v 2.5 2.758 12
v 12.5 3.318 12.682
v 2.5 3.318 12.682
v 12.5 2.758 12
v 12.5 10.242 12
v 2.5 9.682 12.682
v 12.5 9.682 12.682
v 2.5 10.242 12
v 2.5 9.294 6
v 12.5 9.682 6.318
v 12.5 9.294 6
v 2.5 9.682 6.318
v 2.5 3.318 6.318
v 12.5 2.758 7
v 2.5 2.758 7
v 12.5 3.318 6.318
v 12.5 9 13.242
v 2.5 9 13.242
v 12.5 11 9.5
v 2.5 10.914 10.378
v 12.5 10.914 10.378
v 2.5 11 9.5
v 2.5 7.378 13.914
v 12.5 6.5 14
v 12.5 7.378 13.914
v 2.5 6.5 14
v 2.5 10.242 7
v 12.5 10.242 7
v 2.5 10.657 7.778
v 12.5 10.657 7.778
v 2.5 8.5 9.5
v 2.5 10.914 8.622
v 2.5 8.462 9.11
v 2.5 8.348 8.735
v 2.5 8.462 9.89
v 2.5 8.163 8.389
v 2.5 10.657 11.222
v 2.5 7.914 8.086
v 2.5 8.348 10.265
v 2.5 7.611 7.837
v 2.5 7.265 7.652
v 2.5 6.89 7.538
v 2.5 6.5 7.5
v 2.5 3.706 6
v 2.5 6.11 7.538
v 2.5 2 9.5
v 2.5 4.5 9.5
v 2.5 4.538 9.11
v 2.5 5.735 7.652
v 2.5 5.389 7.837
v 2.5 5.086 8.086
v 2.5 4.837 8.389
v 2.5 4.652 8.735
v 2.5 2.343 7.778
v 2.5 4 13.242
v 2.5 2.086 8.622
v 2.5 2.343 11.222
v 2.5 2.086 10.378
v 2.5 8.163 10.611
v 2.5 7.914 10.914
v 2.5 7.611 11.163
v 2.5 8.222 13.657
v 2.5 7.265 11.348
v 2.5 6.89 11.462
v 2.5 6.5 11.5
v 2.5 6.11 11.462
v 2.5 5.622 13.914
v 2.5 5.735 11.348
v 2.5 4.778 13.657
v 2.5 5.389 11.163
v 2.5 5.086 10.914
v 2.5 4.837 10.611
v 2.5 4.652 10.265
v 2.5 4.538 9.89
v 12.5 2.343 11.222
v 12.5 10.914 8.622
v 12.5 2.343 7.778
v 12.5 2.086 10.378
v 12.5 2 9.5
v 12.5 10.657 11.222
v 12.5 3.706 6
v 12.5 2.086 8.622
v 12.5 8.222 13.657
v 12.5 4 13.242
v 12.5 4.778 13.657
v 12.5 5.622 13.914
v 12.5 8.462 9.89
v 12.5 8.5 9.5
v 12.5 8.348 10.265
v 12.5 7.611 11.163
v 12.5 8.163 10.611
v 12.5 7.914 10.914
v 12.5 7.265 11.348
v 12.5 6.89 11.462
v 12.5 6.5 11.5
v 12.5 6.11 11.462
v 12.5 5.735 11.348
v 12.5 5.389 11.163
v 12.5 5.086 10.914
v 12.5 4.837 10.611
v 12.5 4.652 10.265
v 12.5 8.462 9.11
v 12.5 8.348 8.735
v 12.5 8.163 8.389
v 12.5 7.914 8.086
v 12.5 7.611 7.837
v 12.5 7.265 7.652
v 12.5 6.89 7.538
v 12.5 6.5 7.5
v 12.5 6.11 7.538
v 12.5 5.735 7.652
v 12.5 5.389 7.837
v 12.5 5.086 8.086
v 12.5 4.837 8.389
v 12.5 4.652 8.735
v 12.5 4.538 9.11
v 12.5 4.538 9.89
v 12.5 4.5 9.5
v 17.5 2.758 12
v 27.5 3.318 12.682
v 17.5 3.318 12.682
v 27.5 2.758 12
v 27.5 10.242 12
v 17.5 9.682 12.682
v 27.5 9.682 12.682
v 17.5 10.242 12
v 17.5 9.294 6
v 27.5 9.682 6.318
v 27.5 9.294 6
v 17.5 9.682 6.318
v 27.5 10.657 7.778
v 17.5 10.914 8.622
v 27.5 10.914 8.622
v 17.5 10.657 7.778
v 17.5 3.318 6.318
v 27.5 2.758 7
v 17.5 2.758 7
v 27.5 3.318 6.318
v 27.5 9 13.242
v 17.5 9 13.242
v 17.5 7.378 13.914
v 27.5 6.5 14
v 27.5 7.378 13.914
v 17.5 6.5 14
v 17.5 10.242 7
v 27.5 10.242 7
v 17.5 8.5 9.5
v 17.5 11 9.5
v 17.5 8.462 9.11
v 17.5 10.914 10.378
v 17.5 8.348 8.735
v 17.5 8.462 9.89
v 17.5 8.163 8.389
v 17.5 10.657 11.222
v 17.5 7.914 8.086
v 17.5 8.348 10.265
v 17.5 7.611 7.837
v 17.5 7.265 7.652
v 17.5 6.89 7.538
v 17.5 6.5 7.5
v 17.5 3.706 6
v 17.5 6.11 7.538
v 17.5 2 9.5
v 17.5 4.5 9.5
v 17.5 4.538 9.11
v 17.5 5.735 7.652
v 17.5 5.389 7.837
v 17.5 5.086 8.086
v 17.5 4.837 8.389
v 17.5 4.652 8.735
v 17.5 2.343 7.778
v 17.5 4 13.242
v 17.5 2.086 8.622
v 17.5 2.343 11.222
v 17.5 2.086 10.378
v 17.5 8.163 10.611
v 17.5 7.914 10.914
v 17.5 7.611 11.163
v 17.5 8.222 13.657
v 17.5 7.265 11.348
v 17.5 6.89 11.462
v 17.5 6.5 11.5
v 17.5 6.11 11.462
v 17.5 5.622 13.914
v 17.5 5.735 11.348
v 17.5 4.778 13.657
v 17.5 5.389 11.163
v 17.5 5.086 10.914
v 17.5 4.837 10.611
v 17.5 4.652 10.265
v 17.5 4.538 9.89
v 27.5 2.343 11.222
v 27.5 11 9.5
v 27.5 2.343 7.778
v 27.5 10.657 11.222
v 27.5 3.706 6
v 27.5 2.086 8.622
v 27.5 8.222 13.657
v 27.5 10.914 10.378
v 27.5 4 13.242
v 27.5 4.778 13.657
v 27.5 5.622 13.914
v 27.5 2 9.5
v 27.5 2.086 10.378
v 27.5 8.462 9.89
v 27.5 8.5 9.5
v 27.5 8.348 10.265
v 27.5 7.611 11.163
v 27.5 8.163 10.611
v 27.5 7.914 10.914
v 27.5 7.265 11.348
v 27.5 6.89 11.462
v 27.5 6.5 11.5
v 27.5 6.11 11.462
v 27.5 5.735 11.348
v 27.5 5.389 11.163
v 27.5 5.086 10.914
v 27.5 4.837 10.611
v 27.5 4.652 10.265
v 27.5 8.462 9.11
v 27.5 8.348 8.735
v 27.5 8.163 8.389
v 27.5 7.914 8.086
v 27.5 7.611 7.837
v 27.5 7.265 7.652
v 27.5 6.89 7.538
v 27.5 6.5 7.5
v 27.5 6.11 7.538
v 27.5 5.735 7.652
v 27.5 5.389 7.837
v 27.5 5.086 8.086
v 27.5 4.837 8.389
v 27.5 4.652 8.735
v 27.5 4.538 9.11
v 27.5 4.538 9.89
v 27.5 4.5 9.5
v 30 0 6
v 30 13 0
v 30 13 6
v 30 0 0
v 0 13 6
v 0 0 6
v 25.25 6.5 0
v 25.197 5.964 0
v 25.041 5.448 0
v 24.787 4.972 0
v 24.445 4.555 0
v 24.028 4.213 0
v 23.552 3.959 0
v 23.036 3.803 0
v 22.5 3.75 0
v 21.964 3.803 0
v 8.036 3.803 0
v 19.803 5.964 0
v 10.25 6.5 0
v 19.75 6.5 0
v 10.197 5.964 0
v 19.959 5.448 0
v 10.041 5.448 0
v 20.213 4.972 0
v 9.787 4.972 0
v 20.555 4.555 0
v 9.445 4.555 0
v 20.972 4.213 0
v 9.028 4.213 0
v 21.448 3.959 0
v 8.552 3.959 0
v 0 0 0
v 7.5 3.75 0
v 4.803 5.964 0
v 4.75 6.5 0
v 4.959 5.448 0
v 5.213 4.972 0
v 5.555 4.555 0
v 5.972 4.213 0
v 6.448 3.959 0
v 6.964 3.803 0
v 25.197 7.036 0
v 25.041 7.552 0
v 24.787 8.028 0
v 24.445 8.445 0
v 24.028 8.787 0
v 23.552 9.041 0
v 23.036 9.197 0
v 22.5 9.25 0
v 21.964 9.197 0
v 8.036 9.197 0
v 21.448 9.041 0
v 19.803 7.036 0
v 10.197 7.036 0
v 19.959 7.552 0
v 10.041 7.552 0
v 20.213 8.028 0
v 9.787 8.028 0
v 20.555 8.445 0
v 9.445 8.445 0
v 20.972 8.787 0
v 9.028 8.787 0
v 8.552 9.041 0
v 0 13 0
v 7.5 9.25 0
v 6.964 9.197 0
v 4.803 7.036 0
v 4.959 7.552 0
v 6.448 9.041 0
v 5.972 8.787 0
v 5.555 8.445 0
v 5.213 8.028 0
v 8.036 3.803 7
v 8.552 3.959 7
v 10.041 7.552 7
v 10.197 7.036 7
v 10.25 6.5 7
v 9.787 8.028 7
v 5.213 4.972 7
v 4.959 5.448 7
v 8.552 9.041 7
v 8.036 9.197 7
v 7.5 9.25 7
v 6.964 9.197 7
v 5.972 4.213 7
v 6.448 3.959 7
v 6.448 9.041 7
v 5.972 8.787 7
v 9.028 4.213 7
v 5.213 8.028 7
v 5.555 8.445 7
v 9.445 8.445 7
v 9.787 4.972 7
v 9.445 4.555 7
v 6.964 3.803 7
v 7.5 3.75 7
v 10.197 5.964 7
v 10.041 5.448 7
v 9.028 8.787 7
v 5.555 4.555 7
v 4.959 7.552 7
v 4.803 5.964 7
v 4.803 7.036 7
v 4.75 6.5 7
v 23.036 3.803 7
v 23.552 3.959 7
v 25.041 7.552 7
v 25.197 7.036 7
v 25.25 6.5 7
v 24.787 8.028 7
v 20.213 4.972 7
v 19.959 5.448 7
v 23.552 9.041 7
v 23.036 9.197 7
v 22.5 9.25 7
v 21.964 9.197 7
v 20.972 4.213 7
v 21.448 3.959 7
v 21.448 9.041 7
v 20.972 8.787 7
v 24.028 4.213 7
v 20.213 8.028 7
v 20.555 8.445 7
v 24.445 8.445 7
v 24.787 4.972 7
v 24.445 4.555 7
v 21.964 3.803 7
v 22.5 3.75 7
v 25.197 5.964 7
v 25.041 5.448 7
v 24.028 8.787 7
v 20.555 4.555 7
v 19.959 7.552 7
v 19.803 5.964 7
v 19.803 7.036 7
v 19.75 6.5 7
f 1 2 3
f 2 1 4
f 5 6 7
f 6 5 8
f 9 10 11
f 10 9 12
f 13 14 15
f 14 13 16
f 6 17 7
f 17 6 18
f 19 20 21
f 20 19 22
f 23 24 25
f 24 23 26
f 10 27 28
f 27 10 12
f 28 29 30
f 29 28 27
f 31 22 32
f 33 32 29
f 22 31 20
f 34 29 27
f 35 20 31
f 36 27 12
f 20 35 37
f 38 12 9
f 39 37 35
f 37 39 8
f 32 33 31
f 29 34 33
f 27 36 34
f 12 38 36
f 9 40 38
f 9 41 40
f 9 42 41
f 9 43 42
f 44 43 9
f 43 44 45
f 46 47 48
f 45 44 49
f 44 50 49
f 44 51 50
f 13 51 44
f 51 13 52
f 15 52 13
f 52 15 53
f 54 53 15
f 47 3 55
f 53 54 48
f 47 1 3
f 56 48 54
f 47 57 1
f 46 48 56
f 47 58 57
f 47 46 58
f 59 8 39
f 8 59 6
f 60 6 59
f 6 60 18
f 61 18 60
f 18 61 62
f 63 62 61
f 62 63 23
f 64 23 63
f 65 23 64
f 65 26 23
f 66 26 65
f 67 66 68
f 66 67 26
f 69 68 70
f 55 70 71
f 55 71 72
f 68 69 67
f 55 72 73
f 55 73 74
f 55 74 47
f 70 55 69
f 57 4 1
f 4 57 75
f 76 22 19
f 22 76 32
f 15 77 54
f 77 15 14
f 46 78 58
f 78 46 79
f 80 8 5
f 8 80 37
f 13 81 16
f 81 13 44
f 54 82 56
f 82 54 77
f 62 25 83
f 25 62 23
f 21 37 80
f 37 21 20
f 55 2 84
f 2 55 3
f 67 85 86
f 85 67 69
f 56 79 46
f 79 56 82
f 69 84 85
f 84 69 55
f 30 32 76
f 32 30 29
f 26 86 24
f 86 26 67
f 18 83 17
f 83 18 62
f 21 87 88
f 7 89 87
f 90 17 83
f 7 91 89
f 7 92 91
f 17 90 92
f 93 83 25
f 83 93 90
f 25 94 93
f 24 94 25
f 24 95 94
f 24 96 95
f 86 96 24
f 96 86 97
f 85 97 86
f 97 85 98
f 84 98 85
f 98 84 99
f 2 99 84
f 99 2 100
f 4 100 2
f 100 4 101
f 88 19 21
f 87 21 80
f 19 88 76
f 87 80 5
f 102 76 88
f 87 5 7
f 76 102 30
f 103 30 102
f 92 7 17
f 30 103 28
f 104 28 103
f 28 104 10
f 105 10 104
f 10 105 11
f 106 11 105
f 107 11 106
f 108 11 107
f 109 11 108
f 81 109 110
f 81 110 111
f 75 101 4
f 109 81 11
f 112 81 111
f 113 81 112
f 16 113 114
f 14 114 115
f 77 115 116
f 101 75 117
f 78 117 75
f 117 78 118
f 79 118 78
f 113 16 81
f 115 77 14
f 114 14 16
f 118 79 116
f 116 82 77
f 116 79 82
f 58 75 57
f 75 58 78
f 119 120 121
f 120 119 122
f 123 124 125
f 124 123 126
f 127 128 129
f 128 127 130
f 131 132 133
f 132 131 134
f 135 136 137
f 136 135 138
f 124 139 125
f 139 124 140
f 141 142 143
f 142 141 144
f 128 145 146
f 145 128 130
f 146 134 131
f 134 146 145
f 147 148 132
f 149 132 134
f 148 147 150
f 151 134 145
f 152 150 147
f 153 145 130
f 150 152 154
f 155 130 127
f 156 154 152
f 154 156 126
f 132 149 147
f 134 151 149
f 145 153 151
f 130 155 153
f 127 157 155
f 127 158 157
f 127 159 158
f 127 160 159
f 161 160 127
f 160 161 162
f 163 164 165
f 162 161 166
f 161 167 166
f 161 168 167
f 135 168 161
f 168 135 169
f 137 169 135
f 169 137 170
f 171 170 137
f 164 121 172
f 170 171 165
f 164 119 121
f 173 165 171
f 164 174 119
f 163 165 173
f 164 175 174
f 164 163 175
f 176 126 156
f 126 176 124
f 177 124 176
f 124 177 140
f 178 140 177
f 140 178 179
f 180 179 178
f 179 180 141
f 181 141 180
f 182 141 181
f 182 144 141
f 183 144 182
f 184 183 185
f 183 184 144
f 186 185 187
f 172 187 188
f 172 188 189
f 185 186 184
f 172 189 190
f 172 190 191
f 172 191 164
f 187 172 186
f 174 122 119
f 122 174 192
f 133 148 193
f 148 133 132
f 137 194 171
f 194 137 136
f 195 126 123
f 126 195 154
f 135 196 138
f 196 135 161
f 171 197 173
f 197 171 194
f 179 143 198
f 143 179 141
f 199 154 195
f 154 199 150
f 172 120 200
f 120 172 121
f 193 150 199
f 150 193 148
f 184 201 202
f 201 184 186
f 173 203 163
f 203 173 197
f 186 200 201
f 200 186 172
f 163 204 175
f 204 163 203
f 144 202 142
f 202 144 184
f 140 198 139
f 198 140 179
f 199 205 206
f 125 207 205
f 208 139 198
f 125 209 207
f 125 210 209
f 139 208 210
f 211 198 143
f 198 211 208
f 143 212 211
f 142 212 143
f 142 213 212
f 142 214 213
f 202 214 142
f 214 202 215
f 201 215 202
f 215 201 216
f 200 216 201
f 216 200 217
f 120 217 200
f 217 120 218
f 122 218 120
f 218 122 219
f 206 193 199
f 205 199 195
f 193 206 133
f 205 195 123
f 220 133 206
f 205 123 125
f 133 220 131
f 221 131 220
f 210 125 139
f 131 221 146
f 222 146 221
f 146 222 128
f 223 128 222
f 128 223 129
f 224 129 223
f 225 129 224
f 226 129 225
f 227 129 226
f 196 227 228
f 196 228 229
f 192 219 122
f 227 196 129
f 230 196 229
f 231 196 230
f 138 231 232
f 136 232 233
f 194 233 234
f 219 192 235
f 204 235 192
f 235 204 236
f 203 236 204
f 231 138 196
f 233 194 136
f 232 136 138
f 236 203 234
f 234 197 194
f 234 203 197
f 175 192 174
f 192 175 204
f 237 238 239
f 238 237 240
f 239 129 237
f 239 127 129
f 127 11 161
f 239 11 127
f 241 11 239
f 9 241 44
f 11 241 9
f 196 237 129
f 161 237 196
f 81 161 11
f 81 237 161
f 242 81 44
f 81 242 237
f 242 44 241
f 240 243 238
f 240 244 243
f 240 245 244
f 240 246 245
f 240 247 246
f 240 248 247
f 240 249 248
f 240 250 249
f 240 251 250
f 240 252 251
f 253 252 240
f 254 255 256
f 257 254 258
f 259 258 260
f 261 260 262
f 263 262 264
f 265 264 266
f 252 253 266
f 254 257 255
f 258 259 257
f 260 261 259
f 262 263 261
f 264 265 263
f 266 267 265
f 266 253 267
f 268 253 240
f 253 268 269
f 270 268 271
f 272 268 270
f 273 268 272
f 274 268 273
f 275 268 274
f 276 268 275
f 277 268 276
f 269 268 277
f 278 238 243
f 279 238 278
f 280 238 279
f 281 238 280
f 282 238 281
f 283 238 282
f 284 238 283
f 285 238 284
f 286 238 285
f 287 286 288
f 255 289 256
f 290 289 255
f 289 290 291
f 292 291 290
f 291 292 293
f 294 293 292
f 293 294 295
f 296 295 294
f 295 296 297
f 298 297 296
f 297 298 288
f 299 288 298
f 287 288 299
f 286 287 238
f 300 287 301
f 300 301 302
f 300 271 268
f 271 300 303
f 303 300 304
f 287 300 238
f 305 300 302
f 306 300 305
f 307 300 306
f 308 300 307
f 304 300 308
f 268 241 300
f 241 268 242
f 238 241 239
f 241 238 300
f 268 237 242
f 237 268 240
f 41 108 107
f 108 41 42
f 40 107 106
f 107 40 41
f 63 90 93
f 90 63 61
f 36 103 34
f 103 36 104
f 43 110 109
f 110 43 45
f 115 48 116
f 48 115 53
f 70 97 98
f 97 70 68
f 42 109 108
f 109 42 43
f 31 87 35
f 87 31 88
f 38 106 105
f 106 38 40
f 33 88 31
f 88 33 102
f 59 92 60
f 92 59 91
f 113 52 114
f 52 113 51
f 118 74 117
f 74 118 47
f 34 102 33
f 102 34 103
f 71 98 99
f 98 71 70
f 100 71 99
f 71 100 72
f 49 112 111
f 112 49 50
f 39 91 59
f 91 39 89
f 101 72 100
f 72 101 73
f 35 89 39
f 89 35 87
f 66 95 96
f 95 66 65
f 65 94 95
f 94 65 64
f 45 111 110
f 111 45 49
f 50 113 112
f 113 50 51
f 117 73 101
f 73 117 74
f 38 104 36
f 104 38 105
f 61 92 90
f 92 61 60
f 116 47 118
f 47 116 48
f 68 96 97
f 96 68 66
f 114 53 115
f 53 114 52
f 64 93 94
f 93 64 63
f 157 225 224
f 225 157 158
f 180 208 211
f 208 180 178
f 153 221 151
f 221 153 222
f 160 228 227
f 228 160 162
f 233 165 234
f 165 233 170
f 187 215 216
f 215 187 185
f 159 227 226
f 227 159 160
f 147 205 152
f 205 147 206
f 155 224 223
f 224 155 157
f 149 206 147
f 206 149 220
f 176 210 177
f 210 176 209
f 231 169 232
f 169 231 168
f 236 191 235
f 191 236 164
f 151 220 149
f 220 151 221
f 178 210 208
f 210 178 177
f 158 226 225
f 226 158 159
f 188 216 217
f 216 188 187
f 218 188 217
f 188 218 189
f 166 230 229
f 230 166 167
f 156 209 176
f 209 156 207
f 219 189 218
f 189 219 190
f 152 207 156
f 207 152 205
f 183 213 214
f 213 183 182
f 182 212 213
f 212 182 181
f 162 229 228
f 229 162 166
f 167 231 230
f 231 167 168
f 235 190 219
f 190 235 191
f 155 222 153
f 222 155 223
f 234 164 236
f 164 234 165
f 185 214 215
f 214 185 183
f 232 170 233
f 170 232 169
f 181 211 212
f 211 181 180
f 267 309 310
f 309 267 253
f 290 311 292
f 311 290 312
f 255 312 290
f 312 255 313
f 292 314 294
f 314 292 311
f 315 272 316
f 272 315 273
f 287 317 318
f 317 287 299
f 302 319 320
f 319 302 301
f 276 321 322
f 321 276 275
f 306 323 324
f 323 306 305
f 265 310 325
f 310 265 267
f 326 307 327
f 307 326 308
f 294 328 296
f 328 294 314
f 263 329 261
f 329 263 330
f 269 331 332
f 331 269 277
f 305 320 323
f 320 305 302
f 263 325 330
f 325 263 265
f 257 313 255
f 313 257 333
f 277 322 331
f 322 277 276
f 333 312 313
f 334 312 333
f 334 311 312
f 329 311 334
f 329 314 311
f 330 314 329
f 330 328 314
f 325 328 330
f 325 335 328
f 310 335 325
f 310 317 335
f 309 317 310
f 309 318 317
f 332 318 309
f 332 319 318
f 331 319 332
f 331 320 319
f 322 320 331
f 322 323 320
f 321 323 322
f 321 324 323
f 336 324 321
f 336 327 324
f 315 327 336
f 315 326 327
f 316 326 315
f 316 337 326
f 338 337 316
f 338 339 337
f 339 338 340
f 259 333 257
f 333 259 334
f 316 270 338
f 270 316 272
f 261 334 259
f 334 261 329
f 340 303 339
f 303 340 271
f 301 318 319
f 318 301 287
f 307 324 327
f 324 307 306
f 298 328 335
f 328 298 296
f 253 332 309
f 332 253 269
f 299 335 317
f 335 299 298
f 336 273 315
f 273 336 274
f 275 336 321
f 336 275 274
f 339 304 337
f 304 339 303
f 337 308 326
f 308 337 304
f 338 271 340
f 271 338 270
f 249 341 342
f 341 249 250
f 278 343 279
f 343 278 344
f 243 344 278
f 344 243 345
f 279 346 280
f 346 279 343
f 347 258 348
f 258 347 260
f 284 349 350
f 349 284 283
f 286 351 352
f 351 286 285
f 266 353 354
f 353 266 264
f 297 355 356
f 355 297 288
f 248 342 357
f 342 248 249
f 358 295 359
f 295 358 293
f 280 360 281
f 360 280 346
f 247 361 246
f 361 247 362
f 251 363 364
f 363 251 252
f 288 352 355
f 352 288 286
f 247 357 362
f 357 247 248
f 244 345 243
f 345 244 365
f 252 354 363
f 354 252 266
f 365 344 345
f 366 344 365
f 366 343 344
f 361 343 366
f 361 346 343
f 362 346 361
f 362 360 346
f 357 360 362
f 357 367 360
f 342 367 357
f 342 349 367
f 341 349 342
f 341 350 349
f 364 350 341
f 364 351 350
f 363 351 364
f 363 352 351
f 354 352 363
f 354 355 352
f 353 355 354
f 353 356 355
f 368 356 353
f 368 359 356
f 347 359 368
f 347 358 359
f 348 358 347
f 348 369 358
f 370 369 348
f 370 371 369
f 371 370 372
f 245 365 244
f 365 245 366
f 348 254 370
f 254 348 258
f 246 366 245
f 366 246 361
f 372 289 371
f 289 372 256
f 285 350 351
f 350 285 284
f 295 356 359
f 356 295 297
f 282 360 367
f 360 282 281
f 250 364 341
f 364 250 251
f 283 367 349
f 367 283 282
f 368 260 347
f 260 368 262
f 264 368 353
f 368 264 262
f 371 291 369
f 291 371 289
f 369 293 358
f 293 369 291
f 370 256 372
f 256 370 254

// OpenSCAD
$fn = 32;

// ----------------------------------------------------------------------
// Cable clip: cable 4 mm, clamp 9 mm, base 30 mm
// ----------------------------------------------------------------------

// --- parameters (mm) ---
foot_w = 30;              // base length, X
foot_d = 13;              // base width, Y
foot_t = 6;               // base thickness
hose_seat_d = 9;          // clamp outside diameter
ring_t = 2.5;             // clamp wall
cable_d = 4;              // cable opening
ring_w = 10;              // clamp width along the cable
screw_d = 5.5;            // screw clearance
sink = 1;                 // overlap of the clamp into the base
pitch = 15;               // distance between the two clamps

module base() {
  cube([foot_w, foot_d, foot_t]);
}

module clamps() {
  for (sx = [-1, 1])
    translate([foot_w / 2 + sx * pitch / 2, foot_d / 2, foot_t + hose_seat_d / 2 - sink]) rotate([0, 90, 0])
      cylinder(h = ring_w, d = hose_seat_d, center = true);
}

difference() {
  union() {
    base();
    clamps();
  }
  for (sx = [-1, 1])
    translate([foot_w / 2 + sx * pitch / 2, foot_d / 2, foot_t + hose_seat_d / 2 - sink]) rotate([0, 90, 0]) translate([0, 0, -ring_w / 2 - 1]) cylinder(h = ring_w + 2, d = cable_d);
  translate([7.5, foot_d / 2, -1]) cylinder(h = foot_t + 2, d = screw_d);
  translate([22.5, foot_d / 2, -1]) cylinder(h = foot_t + 2, d = screw_d);
}
